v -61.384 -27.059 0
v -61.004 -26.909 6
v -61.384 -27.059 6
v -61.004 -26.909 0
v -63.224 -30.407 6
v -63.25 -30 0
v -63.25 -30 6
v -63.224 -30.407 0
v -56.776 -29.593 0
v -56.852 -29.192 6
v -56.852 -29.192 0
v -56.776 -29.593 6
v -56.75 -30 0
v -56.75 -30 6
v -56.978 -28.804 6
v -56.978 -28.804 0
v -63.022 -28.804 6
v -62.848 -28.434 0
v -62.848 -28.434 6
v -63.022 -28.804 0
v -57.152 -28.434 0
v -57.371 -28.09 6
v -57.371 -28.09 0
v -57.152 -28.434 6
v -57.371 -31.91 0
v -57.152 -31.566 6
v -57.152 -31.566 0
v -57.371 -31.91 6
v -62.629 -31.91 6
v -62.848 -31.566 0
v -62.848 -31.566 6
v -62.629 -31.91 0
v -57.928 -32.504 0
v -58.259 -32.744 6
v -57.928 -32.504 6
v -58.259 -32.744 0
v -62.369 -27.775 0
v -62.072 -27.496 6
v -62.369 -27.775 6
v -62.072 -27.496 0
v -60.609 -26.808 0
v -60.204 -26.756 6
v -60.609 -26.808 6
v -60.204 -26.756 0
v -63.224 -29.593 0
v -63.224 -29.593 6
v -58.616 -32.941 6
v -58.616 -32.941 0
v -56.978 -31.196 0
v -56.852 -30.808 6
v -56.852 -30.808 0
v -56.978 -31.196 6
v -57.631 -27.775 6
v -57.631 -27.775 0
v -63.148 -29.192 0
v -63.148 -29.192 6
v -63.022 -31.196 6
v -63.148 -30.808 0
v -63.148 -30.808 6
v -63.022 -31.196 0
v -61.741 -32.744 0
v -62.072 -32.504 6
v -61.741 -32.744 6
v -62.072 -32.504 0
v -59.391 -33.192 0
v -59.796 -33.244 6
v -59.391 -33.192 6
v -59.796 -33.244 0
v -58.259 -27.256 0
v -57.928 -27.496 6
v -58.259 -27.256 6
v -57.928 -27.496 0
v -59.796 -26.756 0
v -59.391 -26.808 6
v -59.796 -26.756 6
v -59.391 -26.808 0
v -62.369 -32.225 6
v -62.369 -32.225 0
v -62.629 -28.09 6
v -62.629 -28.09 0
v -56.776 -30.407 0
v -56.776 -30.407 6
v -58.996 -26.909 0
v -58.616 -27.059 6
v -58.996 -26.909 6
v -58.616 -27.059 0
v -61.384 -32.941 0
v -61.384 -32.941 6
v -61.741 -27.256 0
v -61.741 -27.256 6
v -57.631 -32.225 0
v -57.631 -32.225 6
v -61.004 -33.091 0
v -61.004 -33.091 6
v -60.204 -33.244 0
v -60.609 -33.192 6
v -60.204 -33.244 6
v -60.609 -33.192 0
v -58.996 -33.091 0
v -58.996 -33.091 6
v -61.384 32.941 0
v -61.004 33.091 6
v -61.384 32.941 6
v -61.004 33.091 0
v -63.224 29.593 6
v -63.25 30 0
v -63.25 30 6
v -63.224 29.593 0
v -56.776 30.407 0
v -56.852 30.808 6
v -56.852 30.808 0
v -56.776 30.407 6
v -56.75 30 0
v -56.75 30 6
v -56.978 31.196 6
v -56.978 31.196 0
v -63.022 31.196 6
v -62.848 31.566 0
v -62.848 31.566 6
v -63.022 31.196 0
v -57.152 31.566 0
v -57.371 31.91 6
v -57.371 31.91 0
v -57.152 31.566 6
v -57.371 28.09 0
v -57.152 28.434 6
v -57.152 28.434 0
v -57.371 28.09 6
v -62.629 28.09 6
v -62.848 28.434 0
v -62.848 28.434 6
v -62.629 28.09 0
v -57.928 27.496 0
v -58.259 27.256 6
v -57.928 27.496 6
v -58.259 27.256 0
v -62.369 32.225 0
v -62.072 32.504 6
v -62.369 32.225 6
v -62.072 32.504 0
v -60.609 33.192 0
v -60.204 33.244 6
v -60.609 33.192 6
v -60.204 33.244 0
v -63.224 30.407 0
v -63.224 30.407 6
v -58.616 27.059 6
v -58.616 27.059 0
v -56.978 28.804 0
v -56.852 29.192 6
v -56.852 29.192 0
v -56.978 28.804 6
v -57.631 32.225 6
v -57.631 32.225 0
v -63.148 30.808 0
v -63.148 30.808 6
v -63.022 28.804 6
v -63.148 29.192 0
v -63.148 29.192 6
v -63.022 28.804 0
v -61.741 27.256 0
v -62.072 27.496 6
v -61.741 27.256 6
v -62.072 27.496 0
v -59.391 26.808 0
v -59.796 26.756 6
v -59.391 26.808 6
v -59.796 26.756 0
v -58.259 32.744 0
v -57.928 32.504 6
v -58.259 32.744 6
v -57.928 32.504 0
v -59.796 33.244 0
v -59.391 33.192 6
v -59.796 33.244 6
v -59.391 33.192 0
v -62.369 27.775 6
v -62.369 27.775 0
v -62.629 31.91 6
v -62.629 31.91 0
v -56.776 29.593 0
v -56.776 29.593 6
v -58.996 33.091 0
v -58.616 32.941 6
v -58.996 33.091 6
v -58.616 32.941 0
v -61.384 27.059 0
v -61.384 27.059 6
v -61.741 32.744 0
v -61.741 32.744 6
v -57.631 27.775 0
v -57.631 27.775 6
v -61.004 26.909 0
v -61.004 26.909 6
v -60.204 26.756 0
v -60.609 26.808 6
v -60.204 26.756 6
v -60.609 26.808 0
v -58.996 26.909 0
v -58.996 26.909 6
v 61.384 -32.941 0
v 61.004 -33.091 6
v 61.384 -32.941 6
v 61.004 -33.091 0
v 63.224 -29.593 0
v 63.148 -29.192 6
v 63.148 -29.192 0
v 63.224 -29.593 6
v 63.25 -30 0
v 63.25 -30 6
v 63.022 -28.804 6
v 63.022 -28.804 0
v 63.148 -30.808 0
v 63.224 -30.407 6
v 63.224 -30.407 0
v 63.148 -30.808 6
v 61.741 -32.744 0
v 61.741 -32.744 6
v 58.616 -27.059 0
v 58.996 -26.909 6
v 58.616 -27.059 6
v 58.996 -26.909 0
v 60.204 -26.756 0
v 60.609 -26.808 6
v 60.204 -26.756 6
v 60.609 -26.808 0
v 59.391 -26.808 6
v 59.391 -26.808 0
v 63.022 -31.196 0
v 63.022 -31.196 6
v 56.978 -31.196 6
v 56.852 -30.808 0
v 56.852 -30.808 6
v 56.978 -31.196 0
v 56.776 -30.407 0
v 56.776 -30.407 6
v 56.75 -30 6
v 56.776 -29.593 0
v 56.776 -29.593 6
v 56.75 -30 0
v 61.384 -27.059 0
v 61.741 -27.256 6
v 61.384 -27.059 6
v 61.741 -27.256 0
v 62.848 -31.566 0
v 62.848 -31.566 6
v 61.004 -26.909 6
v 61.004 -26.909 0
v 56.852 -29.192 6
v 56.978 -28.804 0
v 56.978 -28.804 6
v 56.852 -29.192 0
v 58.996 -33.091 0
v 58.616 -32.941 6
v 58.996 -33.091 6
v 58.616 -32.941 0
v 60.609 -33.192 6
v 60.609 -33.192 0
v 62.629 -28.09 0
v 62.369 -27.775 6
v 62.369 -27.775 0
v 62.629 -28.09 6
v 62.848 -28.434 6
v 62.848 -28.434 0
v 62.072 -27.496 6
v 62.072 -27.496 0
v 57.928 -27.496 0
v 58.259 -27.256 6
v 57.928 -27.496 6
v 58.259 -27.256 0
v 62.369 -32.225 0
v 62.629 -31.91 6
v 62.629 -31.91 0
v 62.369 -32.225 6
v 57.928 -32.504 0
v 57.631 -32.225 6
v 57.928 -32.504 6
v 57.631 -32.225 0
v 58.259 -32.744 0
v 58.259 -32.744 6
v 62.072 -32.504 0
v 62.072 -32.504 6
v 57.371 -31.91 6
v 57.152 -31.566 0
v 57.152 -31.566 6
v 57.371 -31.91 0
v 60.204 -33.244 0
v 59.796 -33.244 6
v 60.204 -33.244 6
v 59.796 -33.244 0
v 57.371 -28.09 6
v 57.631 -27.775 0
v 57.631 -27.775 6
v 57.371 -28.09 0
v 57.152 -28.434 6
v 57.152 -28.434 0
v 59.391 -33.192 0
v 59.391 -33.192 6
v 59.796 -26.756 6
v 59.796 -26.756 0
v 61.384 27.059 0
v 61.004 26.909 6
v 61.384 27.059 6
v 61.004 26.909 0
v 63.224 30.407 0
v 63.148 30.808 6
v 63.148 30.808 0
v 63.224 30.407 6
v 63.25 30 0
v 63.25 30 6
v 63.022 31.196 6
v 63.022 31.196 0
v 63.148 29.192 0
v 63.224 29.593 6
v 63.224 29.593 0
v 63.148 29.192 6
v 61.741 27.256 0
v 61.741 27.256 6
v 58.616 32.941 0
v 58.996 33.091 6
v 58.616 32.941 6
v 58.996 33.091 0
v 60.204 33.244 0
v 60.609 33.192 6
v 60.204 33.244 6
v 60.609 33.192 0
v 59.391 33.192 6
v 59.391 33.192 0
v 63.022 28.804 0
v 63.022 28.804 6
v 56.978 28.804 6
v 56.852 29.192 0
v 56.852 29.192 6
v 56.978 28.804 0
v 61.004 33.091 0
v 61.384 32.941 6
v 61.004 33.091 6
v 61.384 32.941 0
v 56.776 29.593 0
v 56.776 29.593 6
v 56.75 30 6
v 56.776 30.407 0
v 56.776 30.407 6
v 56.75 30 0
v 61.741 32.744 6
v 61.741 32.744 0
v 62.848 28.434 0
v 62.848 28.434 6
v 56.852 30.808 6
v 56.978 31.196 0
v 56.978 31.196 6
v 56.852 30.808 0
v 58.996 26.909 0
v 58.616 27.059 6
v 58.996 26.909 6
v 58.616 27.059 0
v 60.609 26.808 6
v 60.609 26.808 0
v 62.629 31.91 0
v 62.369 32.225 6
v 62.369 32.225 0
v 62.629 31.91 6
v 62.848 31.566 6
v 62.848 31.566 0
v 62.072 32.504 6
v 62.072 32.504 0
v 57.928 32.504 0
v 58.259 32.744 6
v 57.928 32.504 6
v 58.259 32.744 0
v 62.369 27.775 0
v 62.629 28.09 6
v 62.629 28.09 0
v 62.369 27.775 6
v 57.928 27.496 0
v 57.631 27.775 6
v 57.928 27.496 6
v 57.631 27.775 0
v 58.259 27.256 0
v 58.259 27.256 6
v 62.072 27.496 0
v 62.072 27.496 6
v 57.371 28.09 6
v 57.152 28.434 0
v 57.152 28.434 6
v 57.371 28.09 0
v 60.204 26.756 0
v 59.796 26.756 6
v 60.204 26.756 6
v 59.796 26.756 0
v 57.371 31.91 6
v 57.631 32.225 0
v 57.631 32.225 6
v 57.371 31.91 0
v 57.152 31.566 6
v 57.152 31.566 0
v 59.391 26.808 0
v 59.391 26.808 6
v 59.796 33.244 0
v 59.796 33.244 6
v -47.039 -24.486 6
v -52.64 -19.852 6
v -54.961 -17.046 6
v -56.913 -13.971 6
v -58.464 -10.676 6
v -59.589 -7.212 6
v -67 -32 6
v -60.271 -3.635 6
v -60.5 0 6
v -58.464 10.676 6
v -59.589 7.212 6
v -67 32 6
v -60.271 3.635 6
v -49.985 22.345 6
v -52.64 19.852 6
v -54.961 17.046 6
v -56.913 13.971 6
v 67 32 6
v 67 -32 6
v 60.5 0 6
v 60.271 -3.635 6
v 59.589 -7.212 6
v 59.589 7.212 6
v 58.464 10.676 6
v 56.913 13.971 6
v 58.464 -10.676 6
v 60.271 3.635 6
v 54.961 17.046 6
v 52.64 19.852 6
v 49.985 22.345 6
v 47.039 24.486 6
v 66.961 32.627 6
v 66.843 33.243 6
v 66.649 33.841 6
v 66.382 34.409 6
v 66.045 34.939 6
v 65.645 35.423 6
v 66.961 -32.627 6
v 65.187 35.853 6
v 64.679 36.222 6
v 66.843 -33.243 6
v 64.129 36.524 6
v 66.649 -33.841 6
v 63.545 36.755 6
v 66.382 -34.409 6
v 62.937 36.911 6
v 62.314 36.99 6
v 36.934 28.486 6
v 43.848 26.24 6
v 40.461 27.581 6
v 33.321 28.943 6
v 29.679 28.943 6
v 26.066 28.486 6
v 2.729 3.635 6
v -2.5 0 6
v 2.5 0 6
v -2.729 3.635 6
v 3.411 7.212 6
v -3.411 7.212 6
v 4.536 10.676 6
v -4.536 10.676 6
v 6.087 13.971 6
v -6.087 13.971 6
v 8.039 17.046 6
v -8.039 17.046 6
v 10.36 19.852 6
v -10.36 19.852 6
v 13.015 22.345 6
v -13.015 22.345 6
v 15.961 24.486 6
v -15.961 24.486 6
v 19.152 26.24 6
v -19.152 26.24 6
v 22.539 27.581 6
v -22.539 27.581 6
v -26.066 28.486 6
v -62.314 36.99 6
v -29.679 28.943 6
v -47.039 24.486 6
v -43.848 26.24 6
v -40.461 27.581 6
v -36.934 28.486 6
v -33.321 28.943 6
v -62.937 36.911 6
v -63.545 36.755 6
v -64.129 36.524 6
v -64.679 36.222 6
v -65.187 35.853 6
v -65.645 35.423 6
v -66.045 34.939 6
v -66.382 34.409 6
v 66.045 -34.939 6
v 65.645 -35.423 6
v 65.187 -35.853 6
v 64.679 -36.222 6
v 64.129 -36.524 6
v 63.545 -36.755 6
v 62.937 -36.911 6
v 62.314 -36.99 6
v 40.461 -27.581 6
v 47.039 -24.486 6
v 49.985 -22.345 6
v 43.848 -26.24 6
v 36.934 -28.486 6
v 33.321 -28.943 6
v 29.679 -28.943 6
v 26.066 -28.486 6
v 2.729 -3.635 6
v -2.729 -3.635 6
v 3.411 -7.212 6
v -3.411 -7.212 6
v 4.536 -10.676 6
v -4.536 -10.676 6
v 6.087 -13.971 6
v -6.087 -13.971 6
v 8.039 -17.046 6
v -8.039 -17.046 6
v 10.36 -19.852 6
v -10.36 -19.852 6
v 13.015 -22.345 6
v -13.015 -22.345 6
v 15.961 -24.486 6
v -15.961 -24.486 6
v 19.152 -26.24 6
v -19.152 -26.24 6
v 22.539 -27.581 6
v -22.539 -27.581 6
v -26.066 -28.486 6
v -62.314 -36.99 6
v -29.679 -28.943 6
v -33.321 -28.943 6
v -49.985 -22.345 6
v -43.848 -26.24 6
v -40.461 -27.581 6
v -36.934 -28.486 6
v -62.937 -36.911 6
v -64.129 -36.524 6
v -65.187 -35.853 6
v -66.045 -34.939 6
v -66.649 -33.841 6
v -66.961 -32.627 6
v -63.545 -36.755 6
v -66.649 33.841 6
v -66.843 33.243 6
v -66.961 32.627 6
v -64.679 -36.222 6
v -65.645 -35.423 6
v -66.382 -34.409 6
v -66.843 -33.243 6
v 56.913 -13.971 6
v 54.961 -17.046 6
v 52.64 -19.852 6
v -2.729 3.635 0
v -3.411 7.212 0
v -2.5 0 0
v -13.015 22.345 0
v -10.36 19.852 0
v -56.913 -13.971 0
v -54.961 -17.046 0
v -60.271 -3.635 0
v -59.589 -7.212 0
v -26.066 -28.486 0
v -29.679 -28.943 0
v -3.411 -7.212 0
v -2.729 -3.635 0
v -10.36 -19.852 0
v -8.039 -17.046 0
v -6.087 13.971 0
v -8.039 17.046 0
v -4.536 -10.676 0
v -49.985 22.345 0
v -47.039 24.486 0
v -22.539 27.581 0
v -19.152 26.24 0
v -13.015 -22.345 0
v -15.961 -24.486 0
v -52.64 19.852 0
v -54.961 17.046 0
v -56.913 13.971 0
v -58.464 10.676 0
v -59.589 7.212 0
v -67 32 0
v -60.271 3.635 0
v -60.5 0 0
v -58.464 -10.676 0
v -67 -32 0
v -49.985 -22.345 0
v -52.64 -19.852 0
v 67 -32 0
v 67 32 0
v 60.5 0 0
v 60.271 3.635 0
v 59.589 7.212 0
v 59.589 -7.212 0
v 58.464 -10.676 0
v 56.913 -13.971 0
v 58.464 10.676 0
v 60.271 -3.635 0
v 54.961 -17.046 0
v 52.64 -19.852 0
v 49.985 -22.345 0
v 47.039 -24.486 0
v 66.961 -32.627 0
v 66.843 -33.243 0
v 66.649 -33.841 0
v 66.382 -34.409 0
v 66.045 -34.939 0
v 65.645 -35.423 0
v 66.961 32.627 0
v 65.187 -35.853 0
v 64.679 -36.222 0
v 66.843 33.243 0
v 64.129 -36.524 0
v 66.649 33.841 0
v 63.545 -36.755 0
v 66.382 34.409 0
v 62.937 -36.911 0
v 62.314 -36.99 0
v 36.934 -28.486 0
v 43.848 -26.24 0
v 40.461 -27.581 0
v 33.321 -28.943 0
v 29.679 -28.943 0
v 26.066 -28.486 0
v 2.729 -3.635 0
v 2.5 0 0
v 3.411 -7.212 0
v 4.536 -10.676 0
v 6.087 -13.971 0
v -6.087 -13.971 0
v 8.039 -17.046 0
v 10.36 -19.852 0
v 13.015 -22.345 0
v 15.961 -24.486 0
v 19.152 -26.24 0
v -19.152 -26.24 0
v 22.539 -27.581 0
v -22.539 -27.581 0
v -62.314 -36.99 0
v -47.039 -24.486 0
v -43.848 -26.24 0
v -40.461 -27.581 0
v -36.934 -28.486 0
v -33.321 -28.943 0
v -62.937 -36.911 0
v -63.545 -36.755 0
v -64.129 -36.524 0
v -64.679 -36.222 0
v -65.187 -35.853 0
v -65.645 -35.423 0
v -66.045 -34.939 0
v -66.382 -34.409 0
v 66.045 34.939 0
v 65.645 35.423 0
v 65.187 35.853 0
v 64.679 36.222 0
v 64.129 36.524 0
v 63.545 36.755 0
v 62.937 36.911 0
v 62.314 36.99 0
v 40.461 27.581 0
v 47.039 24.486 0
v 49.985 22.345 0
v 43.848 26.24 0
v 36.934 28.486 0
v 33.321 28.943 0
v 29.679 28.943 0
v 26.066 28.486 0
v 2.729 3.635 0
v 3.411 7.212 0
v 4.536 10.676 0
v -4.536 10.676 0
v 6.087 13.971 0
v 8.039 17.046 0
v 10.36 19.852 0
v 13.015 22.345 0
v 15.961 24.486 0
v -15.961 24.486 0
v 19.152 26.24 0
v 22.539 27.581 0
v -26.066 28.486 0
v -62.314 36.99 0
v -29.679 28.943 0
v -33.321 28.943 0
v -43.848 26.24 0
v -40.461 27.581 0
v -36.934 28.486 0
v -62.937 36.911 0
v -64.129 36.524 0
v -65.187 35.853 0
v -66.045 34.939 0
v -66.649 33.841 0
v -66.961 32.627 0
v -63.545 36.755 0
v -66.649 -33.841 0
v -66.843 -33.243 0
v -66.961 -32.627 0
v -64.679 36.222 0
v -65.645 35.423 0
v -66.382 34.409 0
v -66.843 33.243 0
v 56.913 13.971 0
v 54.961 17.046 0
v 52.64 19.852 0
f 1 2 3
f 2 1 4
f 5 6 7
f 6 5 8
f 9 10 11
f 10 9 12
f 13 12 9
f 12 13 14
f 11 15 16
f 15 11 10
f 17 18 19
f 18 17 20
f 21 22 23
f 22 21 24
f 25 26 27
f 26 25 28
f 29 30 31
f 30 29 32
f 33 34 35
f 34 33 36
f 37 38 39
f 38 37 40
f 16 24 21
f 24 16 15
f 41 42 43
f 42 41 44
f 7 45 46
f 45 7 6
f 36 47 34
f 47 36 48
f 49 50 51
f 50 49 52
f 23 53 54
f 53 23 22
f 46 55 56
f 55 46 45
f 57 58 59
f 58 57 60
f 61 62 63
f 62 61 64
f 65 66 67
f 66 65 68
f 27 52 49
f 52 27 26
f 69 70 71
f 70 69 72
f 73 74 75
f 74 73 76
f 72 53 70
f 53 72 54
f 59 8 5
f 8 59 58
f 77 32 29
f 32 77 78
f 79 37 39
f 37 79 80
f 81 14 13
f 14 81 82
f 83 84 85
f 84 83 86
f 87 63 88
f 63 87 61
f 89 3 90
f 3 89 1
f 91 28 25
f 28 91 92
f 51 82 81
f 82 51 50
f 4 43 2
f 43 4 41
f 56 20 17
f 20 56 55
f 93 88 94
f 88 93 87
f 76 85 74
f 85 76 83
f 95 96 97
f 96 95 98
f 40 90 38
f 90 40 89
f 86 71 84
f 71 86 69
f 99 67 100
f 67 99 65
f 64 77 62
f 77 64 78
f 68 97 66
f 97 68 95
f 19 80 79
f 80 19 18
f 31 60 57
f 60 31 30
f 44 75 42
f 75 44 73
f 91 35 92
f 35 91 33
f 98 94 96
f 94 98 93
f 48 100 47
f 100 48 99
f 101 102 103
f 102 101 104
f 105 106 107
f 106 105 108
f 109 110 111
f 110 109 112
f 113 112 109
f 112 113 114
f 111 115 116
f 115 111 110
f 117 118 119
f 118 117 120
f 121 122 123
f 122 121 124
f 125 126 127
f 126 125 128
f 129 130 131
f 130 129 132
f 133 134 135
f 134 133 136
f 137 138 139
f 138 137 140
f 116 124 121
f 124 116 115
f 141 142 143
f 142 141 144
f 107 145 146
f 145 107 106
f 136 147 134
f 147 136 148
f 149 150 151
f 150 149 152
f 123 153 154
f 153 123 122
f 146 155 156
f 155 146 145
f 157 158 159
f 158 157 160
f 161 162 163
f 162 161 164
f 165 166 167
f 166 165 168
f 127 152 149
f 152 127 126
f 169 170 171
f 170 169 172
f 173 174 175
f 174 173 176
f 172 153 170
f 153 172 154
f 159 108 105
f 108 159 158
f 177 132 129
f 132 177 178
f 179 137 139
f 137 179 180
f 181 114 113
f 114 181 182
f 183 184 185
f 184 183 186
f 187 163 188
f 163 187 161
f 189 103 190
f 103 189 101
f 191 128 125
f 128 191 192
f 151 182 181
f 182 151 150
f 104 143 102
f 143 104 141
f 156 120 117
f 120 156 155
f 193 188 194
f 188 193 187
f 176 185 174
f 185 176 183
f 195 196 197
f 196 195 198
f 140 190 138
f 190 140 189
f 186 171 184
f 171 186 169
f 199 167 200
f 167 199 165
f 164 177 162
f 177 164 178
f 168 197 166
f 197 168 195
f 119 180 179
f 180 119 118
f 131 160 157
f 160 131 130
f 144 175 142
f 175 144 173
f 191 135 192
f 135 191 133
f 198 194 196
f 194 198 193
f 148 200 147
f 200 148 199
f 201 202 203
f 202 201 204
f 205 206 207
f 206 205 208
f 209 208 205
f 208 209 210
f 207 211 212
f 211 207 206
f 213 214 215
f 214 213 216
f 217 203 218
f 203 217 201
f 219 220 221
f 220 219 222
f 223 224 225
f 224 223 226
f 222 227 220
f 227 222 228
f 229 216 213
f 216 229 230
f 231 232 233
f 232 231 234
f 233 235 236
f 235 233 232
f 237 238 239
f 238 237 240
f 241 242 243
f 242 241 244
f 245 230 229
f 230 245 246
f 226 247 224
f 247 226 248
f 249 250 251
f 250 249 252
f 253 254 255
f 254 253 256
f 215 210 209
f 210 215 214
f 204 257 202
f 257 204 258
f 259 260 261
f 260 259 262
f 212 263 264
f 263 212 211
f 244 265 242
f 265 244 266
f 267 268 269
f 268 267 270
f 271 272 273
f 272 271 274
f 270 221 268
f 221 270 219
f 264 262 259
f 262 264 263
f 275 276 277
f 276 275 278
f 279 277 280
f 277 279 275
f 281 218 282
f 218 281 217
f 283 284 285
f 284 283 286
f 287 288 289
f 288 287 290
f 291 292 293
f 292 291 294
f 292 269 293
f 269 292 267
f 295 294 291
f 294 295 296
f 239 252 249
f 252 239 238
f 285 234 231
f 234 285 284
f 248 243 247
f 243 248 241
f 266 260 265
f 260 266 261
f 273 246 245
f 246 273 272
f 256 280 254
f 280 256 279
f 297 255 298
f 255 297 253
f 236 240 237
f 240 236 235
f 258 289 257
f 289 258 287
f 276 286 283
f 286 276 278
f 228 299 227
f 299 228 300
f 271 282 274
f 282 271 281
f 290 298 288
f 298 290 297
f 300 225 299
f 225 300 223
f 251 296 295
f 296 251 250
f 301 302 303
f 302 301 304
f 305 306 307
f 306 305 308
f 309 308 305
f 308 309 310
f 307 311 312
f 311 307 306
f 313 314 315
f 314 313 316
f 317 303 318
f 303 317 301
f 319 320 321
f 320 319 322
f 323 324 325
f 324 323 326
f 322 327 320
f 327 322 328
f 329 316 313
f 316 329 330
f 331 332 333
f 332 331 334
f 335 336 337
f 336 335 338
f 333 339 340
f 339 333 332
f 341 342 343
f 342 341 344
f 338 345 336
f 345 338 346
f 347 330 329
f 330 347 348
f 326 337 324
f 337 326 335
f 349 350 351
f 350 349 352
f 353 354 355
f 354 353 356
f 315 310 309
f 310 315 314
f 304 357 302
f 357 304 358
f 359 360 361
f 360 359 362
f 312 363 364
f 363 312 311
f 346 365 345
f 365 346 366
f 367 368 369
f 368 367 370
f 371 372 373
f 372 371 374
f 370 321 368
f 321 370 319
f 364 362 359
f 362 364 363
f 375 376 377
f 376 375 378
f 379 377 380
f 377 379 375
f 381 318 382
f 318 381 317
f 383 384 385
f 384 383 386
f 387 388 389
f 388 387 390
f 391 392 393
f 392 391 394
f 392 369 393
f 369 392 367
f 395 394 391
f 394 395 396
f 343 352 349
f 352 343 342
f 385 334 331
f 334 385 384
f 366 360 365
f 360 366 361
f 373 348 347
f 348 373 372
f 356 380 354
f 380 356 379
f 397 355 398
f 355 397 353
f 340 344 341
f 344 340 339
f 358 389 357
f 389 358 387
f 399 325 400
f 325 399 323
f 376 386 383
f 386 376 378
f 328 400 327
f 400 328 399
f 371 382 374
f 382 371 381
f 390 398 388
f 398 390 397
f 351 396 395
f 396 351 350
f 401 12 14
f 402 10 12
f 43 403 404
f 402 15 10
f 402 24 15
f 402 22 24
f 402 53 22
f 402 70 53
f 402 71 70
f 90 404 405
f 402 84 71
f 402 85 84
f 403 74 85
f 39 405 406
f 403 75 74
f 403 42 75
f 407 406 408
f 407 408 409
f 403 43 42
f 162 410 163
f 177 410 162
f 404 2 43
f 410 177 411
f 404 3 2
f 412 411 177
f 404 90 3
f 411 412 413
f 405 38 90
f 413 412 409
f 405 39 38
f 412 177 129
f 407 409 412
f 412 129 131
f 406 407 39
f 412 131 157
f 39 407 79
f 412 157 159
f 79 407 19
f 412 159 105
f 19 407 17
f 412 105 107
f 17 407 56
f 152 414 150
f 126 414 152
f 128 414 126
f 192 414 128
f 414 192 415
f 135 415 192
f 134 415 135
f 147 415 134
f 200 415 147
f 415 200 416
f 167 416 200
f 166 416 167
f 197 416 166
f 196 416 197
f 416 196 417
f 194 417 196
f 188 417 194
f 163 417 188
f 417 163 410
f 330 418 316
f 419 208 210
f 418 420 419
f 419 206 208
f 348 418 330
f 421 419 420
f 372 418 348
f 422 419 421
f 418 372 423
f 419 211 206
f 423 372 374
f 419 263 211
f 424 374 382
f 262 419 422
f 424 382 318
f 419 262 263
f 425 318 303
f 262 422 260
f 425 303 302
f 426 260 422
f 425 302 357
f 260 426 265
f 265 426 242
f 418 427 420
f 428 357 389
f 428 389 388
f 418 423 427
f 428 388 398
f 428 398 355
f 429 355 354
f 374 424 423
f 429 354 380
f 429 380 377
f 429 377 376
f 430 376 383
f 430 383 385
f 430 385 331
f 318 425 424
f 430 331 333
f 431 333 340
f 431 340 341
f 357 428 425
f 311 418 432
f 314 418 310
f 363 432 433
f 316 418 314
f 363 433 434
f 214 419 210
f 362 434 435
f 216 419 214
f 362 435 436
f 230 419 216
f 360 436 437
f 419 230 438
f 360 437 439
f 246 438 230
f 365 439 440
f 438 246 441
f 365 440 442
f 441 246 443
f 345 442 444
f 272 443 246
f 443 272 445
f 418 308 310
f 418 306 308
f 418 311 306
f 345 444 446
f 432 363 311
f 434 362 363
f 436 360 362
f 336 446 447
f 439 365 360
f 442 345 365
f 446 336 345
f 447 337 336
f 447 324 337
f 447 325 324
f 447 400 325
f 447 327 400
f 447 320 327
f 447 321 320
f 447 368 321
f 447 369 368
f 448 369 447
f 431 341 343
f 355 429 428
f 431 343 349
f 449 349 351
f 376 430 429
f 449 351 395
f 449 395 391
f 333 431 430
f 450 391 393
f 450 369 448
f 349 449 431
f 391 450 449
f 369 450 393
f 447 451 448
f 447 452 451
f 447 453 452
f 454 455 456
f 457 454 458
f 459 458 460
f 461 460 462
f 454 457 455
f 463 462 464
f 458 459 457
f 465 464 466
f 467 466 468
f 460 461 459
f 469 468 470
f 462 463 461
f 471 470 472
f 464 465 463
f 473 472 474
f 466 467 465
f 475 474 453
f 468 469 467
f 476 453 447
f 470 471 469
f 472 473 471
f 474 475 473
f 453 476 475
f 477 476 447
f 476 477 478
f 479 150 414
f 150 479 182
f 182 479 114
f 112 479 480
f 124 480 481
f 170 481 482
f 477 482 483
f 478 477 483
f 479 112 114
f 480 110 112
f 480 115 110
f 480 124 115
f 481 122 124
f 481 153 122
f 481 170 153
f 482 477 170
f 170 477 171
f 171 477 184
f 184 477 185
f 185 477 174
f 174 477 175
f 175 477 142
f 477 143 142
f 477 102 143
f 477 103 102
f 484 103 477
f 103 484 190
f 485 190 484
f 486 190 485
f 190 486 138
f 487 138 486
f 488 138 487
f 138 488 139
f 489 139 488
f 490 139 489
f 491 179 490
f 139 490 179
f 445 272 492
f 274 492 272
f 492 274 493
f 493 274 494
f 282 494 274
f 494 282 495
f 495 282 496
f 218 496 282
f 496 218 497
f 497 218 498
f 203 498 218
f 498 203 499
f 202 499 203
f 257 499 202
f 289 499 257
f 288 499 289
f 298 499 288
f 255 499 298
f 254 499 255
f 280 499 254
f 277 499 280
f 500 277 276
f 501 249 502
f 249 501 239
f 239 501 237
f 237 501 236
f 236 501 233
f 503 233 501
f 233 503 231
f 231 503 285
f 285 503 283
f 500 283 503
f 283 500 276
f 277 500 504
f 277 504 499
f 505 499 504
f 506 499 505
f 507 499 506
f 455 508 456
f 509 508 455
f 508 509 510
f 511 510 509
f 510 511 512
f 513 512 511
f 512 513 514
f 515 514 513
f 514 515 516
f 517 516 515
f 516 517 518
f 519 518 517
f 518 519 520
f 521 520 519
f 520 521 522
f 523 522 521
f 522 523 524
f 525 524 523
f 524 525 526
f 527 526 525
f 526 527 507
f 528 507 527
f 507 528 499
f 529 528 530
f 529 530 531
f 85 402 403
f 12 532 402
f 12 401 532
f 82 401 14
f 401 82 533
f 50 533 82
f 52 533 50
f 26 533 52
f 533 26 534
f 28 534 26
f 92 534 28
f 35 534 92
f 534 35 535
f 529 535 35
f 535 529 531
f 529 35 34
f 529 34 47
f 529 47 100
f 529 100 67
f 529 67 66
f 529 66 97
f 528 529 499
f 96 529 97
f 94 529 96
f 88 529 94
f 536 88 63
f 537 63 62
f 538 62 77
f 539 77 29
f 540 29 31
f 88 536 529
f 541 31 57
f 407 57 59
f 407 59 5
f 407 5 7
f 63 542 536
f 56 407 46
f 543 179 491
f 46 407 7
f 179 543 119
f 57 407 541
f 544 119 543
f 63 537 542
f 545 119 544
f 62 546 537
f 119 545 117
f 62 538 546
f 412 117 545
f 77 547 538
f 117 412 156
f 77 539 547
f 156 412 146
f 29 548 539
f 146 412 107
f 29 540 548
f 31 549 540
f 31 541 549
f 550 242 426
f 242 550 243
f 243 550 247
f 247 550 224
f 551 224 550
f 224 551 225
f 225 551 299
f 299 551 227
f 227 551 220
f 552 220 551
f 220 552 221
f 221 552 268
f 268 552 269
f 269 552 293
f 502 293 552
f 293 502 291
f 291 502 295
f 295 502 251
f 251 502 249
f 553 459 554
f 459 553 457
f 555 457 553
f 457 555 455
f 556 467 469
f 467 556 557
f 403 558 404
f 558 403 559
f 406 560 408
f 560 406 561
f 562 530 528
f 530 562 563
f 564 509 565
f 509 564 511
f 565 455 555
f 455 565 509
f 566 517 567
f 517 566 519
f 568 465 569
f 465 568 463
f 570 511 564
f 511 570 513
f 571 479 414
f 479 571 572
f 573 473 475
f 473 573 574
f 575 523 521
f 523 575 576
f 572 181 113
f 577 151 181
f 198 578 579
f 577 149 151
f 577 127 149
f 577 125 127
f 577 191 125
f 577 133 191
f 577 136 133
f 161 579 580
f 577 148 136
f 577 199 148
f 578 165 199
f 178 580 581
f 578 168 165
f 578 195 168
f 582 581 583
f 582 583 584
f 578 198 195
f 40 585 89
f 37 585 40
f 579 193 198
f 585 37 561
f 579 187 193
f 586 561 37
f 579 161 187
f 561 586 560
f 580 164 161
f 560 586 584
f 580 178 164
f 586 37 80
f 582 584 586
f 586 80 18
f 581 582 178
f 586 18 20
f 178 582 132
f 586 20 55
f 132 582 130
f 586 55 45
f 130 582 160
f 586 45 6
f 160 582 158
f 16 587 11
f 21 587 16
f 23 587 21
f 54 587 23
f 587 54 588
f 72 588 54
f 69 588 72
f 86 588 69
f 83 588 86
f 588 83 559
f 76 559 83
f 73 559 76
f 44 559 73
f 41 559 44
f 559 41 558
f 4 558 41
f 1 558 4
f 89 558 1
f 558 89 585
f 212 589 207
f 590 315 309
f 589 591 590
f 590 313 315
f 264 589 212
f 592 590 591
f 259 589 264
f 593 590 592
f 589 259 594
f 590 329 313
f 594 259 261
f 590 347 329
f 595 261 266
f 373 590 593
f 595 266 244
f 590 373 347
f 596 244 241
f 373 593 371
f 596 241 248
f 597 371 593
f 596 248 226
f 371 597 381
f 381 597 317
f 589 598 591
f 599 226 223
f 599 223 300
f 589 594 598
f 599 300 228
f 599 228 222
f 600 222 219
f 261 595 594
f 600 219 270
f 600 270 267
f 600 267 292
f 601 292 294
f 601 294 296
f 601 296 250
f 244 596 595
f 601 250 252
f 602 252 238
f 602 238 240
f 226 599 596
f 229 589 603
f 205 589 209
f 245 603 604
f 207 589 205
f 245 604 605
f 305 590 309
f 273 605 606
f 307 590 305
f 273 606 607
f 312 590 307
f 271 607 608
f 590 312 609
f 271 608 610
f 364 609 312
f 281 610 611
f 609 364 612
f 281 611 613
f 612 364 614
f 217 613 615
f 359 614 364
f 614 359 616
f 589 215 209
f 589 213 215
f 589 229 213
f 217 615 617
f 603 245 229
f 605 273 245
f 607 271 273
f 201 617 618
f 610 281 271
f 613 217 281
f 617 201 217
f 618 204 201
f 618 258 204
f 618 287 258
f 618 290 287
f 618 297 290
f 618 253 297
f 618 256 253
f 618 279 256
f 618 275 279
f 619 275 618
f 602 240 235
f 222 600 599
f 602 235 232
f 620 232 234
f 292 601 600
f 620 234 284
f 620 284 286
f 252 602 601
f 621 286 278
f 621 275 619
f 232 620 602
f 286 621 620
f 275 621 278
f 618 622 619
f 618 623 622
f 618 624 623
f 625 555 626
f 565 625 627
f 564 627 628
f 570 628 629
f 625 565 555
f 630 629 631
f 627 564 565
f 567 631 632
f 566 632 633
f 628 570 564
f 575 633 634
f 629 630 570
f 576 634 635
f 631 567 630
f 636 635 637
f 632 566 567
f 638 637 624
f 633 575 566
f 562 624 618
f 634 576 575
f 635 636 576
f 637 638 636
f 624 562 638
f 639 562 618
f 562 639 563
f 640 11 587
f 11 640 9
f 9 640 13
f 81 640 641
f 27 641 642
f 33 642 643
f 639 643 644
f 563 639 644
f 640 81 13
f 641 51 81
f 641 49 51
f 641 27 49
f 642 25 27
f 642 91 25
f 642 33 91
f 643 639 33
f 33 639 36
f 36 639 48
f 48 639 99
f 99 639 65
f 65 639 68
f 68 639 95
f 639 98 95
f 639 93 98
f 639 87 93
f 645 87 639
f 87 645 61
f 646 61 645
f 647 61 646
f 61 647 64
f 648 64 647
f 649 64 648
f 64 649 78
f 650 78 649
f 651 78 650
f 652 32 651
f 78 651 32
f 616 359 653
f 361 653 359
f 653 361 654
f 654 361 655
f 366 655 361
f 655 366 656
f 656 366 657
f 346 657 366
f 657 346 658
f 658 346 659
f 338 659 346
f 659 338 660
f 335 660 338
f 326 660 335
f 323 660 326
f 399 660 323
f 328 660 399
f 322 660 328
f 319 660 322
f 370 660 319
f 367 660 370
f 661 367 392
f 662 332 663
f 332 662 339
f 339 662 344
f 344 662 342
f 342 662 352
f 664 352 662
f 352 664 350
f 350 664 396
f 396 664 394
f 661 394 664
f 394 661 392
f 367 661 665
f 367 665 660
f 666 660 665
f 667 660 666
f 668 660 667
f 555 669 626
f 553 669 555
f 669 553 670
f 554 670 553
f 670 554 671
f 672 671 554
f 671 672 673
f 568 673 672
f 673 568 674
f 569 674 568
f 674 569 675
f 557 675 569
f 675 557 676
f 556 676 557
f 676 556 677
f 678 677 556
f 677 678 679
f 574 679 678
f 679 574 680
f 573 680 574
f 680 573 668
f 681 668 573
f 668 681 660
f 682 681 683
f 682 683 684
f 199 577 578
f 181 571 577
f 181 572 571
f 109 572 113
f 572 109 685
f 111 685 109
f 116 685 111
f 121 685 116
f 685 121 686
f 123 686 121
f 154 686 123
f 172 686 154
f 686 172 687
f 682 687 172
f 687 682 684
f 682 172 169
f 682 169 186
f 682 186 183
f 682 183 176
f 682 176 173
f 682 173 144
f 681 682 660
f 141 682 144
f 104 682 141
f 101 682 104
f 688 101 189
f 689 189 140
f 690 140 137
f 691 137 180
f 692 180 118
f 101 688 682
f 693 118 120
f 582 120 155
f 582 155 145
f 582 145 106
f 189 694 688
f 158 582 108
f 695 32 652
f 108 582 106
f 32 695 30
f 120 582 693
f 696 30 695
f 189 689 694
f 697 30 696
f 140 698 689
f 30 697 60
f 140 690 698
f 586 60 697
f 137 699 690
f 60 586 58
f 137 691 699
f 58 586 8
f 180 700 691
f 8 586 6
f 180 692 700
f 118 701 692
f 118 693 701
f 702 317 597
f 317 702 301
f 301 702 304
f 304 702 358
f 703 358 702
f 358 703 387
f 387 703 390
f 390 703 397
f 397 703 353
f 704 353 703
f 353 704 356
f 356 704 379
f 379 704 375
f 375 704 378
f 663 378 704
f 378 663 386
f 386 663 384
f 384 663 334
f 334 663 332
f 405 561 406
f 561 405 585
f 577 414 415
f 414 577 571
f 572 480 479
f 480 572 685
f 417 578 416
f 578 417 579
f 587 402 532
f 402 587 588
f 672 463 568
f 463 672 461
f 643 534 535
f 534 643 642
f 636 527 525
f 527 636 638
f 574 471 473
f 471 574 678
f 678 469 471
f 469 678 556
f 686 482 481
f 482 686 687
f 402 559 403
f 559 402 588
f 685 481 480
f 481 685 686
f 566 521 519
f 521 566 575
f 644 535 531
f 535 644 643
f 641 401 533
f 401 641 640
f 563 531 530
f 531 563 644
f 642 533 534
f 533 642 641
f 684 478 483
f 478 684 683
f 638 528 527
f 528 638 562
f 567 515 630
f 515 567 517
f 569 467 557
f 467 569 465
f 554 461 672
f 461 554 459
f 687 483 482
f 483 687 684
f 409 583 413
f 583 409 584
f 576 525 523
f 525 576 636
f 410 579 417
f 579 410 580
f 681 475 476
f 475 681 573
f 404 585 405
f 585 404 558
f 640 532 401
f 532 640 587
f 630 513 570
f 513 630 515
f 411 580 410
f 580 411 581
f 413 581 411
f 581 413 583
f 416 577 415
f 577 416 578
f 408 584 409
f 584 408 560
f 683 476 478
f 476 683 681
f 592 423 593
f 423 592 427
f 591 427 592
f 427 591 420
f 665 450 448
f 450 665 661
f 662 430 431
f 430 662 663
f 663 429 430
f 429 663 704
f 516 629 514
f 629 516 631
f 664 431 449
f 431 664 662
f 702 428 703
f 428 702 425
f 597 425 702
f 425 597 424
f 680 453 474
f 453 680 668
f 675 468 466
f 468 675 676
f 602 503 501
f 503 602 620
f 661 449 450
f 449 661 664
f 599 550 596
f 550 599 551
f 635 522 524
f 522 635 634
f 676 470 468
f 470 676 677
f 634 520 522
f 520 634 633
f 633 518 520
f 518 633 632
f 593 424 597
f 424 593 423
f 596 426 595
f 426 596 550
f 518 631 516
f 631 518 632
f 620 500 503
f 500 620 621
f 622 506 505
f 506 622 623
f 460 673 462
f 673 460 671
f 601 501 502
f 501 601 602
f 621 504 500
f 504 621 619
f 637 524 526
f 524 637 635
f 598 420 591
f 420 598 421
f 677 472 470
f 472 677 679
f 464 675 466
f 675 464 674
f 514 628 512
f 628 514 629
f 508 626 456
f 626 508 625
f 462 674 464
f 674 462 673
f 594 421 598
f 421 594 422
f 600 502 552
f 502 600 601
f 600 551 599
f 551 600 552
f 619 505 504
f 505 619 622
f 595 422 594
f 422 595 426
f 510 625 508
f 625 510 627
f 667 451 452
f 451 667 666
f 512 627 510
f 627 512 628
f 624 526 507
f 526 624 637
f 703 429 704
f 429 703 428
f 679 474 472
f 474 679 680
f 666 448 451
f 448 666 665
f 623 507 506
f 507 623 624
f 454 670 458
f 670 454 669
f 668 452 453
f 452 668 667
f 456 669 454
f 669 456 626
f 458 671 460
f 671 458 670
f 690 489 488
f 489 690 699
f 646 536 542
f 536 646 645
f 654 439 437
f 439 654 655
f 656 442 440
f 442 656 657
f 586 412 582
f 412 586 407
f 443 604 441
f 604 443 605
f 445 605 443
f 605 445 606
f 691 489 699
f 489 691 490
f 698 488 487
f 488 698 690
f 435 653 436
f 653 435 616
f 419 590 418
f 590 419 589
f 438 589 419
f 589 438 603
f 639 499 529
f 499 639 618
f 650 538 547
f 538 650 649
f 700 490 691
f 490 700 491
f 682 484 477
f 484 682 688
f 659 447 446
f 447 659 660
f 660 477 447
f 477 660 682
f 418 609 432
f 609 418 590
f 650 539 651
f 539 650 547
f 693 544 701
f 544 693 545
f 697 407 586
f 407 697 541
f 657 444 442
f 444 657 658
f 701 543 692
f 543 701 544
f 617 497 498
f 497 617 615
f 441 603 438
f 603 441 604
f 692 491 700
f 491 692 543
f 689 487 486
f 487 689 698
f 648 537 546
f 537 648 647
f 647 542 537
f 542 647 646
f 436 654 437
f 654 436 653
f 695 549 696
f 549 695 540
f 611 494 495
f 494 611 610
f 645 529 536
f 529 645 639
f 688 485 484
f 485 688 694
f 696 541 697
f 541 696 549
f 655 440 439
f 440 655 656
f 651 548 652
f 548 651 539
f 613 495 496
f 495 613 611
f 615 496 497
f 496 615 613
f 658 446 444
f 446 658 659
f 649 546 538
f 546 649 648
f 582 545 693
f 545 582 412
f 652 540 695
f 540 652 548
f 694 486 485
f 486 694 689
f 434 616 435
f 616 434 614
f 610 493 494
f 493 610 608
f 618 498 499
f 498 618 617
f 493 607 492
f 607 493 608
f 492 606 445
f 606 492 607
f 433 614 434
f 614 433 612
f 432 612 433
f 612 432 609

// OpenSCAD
$fn = 50;


difference() {
	union() {
		hull() {
			translate(v = [-62.0000000000, 32.0000000000, 0]) {
				cylinder(h = 6, r = 5);
			}
			translate(v = [62.0000000000, 32.0000000000, 0]) {
				cylinder(h = 6, r = 5);
			}
			translate(v = [-62.0000000000, -32.0000000000, 0]) {
				cylinder(h = 6, r = 5);
			}
			translate(v = [62.0000000000, -32.0000000000, 0]) {
				cylinder(h = 6, r = 5);
			}
		}
	}
	union() {
		#translate(v = [-60.0000000000, -30.0000000000, -100.0000000000]) {
			cylinder(h = 200, r = 3.2500000000);
		}
		#translate(v = [-60.0000000000, 30.0000000000, -100.0000000000]) {
			cylinder(h = 200, r = 3.2500000000);
		}
		#translate(v = [60.0000000000, -30.0000000000, -100.0000000000]) {
			cylinder(h = 200, r = 3.2500000000);
		}
		#translate(v = [60.0000000000, 30.0000000000, -100.0000000000]) {
			cylinder(h = 200, r = 3.2500000000);
		}
		#translate(v = [-31.5000000000, 0, 0]) {
			cylinder(h = 6, r = 29.0000000000);
		}
		#translate(v = [31.5000000000, 0, 0]) {
			cylinder(h = 6, r = 29.0000000000);
		}
	}
}
